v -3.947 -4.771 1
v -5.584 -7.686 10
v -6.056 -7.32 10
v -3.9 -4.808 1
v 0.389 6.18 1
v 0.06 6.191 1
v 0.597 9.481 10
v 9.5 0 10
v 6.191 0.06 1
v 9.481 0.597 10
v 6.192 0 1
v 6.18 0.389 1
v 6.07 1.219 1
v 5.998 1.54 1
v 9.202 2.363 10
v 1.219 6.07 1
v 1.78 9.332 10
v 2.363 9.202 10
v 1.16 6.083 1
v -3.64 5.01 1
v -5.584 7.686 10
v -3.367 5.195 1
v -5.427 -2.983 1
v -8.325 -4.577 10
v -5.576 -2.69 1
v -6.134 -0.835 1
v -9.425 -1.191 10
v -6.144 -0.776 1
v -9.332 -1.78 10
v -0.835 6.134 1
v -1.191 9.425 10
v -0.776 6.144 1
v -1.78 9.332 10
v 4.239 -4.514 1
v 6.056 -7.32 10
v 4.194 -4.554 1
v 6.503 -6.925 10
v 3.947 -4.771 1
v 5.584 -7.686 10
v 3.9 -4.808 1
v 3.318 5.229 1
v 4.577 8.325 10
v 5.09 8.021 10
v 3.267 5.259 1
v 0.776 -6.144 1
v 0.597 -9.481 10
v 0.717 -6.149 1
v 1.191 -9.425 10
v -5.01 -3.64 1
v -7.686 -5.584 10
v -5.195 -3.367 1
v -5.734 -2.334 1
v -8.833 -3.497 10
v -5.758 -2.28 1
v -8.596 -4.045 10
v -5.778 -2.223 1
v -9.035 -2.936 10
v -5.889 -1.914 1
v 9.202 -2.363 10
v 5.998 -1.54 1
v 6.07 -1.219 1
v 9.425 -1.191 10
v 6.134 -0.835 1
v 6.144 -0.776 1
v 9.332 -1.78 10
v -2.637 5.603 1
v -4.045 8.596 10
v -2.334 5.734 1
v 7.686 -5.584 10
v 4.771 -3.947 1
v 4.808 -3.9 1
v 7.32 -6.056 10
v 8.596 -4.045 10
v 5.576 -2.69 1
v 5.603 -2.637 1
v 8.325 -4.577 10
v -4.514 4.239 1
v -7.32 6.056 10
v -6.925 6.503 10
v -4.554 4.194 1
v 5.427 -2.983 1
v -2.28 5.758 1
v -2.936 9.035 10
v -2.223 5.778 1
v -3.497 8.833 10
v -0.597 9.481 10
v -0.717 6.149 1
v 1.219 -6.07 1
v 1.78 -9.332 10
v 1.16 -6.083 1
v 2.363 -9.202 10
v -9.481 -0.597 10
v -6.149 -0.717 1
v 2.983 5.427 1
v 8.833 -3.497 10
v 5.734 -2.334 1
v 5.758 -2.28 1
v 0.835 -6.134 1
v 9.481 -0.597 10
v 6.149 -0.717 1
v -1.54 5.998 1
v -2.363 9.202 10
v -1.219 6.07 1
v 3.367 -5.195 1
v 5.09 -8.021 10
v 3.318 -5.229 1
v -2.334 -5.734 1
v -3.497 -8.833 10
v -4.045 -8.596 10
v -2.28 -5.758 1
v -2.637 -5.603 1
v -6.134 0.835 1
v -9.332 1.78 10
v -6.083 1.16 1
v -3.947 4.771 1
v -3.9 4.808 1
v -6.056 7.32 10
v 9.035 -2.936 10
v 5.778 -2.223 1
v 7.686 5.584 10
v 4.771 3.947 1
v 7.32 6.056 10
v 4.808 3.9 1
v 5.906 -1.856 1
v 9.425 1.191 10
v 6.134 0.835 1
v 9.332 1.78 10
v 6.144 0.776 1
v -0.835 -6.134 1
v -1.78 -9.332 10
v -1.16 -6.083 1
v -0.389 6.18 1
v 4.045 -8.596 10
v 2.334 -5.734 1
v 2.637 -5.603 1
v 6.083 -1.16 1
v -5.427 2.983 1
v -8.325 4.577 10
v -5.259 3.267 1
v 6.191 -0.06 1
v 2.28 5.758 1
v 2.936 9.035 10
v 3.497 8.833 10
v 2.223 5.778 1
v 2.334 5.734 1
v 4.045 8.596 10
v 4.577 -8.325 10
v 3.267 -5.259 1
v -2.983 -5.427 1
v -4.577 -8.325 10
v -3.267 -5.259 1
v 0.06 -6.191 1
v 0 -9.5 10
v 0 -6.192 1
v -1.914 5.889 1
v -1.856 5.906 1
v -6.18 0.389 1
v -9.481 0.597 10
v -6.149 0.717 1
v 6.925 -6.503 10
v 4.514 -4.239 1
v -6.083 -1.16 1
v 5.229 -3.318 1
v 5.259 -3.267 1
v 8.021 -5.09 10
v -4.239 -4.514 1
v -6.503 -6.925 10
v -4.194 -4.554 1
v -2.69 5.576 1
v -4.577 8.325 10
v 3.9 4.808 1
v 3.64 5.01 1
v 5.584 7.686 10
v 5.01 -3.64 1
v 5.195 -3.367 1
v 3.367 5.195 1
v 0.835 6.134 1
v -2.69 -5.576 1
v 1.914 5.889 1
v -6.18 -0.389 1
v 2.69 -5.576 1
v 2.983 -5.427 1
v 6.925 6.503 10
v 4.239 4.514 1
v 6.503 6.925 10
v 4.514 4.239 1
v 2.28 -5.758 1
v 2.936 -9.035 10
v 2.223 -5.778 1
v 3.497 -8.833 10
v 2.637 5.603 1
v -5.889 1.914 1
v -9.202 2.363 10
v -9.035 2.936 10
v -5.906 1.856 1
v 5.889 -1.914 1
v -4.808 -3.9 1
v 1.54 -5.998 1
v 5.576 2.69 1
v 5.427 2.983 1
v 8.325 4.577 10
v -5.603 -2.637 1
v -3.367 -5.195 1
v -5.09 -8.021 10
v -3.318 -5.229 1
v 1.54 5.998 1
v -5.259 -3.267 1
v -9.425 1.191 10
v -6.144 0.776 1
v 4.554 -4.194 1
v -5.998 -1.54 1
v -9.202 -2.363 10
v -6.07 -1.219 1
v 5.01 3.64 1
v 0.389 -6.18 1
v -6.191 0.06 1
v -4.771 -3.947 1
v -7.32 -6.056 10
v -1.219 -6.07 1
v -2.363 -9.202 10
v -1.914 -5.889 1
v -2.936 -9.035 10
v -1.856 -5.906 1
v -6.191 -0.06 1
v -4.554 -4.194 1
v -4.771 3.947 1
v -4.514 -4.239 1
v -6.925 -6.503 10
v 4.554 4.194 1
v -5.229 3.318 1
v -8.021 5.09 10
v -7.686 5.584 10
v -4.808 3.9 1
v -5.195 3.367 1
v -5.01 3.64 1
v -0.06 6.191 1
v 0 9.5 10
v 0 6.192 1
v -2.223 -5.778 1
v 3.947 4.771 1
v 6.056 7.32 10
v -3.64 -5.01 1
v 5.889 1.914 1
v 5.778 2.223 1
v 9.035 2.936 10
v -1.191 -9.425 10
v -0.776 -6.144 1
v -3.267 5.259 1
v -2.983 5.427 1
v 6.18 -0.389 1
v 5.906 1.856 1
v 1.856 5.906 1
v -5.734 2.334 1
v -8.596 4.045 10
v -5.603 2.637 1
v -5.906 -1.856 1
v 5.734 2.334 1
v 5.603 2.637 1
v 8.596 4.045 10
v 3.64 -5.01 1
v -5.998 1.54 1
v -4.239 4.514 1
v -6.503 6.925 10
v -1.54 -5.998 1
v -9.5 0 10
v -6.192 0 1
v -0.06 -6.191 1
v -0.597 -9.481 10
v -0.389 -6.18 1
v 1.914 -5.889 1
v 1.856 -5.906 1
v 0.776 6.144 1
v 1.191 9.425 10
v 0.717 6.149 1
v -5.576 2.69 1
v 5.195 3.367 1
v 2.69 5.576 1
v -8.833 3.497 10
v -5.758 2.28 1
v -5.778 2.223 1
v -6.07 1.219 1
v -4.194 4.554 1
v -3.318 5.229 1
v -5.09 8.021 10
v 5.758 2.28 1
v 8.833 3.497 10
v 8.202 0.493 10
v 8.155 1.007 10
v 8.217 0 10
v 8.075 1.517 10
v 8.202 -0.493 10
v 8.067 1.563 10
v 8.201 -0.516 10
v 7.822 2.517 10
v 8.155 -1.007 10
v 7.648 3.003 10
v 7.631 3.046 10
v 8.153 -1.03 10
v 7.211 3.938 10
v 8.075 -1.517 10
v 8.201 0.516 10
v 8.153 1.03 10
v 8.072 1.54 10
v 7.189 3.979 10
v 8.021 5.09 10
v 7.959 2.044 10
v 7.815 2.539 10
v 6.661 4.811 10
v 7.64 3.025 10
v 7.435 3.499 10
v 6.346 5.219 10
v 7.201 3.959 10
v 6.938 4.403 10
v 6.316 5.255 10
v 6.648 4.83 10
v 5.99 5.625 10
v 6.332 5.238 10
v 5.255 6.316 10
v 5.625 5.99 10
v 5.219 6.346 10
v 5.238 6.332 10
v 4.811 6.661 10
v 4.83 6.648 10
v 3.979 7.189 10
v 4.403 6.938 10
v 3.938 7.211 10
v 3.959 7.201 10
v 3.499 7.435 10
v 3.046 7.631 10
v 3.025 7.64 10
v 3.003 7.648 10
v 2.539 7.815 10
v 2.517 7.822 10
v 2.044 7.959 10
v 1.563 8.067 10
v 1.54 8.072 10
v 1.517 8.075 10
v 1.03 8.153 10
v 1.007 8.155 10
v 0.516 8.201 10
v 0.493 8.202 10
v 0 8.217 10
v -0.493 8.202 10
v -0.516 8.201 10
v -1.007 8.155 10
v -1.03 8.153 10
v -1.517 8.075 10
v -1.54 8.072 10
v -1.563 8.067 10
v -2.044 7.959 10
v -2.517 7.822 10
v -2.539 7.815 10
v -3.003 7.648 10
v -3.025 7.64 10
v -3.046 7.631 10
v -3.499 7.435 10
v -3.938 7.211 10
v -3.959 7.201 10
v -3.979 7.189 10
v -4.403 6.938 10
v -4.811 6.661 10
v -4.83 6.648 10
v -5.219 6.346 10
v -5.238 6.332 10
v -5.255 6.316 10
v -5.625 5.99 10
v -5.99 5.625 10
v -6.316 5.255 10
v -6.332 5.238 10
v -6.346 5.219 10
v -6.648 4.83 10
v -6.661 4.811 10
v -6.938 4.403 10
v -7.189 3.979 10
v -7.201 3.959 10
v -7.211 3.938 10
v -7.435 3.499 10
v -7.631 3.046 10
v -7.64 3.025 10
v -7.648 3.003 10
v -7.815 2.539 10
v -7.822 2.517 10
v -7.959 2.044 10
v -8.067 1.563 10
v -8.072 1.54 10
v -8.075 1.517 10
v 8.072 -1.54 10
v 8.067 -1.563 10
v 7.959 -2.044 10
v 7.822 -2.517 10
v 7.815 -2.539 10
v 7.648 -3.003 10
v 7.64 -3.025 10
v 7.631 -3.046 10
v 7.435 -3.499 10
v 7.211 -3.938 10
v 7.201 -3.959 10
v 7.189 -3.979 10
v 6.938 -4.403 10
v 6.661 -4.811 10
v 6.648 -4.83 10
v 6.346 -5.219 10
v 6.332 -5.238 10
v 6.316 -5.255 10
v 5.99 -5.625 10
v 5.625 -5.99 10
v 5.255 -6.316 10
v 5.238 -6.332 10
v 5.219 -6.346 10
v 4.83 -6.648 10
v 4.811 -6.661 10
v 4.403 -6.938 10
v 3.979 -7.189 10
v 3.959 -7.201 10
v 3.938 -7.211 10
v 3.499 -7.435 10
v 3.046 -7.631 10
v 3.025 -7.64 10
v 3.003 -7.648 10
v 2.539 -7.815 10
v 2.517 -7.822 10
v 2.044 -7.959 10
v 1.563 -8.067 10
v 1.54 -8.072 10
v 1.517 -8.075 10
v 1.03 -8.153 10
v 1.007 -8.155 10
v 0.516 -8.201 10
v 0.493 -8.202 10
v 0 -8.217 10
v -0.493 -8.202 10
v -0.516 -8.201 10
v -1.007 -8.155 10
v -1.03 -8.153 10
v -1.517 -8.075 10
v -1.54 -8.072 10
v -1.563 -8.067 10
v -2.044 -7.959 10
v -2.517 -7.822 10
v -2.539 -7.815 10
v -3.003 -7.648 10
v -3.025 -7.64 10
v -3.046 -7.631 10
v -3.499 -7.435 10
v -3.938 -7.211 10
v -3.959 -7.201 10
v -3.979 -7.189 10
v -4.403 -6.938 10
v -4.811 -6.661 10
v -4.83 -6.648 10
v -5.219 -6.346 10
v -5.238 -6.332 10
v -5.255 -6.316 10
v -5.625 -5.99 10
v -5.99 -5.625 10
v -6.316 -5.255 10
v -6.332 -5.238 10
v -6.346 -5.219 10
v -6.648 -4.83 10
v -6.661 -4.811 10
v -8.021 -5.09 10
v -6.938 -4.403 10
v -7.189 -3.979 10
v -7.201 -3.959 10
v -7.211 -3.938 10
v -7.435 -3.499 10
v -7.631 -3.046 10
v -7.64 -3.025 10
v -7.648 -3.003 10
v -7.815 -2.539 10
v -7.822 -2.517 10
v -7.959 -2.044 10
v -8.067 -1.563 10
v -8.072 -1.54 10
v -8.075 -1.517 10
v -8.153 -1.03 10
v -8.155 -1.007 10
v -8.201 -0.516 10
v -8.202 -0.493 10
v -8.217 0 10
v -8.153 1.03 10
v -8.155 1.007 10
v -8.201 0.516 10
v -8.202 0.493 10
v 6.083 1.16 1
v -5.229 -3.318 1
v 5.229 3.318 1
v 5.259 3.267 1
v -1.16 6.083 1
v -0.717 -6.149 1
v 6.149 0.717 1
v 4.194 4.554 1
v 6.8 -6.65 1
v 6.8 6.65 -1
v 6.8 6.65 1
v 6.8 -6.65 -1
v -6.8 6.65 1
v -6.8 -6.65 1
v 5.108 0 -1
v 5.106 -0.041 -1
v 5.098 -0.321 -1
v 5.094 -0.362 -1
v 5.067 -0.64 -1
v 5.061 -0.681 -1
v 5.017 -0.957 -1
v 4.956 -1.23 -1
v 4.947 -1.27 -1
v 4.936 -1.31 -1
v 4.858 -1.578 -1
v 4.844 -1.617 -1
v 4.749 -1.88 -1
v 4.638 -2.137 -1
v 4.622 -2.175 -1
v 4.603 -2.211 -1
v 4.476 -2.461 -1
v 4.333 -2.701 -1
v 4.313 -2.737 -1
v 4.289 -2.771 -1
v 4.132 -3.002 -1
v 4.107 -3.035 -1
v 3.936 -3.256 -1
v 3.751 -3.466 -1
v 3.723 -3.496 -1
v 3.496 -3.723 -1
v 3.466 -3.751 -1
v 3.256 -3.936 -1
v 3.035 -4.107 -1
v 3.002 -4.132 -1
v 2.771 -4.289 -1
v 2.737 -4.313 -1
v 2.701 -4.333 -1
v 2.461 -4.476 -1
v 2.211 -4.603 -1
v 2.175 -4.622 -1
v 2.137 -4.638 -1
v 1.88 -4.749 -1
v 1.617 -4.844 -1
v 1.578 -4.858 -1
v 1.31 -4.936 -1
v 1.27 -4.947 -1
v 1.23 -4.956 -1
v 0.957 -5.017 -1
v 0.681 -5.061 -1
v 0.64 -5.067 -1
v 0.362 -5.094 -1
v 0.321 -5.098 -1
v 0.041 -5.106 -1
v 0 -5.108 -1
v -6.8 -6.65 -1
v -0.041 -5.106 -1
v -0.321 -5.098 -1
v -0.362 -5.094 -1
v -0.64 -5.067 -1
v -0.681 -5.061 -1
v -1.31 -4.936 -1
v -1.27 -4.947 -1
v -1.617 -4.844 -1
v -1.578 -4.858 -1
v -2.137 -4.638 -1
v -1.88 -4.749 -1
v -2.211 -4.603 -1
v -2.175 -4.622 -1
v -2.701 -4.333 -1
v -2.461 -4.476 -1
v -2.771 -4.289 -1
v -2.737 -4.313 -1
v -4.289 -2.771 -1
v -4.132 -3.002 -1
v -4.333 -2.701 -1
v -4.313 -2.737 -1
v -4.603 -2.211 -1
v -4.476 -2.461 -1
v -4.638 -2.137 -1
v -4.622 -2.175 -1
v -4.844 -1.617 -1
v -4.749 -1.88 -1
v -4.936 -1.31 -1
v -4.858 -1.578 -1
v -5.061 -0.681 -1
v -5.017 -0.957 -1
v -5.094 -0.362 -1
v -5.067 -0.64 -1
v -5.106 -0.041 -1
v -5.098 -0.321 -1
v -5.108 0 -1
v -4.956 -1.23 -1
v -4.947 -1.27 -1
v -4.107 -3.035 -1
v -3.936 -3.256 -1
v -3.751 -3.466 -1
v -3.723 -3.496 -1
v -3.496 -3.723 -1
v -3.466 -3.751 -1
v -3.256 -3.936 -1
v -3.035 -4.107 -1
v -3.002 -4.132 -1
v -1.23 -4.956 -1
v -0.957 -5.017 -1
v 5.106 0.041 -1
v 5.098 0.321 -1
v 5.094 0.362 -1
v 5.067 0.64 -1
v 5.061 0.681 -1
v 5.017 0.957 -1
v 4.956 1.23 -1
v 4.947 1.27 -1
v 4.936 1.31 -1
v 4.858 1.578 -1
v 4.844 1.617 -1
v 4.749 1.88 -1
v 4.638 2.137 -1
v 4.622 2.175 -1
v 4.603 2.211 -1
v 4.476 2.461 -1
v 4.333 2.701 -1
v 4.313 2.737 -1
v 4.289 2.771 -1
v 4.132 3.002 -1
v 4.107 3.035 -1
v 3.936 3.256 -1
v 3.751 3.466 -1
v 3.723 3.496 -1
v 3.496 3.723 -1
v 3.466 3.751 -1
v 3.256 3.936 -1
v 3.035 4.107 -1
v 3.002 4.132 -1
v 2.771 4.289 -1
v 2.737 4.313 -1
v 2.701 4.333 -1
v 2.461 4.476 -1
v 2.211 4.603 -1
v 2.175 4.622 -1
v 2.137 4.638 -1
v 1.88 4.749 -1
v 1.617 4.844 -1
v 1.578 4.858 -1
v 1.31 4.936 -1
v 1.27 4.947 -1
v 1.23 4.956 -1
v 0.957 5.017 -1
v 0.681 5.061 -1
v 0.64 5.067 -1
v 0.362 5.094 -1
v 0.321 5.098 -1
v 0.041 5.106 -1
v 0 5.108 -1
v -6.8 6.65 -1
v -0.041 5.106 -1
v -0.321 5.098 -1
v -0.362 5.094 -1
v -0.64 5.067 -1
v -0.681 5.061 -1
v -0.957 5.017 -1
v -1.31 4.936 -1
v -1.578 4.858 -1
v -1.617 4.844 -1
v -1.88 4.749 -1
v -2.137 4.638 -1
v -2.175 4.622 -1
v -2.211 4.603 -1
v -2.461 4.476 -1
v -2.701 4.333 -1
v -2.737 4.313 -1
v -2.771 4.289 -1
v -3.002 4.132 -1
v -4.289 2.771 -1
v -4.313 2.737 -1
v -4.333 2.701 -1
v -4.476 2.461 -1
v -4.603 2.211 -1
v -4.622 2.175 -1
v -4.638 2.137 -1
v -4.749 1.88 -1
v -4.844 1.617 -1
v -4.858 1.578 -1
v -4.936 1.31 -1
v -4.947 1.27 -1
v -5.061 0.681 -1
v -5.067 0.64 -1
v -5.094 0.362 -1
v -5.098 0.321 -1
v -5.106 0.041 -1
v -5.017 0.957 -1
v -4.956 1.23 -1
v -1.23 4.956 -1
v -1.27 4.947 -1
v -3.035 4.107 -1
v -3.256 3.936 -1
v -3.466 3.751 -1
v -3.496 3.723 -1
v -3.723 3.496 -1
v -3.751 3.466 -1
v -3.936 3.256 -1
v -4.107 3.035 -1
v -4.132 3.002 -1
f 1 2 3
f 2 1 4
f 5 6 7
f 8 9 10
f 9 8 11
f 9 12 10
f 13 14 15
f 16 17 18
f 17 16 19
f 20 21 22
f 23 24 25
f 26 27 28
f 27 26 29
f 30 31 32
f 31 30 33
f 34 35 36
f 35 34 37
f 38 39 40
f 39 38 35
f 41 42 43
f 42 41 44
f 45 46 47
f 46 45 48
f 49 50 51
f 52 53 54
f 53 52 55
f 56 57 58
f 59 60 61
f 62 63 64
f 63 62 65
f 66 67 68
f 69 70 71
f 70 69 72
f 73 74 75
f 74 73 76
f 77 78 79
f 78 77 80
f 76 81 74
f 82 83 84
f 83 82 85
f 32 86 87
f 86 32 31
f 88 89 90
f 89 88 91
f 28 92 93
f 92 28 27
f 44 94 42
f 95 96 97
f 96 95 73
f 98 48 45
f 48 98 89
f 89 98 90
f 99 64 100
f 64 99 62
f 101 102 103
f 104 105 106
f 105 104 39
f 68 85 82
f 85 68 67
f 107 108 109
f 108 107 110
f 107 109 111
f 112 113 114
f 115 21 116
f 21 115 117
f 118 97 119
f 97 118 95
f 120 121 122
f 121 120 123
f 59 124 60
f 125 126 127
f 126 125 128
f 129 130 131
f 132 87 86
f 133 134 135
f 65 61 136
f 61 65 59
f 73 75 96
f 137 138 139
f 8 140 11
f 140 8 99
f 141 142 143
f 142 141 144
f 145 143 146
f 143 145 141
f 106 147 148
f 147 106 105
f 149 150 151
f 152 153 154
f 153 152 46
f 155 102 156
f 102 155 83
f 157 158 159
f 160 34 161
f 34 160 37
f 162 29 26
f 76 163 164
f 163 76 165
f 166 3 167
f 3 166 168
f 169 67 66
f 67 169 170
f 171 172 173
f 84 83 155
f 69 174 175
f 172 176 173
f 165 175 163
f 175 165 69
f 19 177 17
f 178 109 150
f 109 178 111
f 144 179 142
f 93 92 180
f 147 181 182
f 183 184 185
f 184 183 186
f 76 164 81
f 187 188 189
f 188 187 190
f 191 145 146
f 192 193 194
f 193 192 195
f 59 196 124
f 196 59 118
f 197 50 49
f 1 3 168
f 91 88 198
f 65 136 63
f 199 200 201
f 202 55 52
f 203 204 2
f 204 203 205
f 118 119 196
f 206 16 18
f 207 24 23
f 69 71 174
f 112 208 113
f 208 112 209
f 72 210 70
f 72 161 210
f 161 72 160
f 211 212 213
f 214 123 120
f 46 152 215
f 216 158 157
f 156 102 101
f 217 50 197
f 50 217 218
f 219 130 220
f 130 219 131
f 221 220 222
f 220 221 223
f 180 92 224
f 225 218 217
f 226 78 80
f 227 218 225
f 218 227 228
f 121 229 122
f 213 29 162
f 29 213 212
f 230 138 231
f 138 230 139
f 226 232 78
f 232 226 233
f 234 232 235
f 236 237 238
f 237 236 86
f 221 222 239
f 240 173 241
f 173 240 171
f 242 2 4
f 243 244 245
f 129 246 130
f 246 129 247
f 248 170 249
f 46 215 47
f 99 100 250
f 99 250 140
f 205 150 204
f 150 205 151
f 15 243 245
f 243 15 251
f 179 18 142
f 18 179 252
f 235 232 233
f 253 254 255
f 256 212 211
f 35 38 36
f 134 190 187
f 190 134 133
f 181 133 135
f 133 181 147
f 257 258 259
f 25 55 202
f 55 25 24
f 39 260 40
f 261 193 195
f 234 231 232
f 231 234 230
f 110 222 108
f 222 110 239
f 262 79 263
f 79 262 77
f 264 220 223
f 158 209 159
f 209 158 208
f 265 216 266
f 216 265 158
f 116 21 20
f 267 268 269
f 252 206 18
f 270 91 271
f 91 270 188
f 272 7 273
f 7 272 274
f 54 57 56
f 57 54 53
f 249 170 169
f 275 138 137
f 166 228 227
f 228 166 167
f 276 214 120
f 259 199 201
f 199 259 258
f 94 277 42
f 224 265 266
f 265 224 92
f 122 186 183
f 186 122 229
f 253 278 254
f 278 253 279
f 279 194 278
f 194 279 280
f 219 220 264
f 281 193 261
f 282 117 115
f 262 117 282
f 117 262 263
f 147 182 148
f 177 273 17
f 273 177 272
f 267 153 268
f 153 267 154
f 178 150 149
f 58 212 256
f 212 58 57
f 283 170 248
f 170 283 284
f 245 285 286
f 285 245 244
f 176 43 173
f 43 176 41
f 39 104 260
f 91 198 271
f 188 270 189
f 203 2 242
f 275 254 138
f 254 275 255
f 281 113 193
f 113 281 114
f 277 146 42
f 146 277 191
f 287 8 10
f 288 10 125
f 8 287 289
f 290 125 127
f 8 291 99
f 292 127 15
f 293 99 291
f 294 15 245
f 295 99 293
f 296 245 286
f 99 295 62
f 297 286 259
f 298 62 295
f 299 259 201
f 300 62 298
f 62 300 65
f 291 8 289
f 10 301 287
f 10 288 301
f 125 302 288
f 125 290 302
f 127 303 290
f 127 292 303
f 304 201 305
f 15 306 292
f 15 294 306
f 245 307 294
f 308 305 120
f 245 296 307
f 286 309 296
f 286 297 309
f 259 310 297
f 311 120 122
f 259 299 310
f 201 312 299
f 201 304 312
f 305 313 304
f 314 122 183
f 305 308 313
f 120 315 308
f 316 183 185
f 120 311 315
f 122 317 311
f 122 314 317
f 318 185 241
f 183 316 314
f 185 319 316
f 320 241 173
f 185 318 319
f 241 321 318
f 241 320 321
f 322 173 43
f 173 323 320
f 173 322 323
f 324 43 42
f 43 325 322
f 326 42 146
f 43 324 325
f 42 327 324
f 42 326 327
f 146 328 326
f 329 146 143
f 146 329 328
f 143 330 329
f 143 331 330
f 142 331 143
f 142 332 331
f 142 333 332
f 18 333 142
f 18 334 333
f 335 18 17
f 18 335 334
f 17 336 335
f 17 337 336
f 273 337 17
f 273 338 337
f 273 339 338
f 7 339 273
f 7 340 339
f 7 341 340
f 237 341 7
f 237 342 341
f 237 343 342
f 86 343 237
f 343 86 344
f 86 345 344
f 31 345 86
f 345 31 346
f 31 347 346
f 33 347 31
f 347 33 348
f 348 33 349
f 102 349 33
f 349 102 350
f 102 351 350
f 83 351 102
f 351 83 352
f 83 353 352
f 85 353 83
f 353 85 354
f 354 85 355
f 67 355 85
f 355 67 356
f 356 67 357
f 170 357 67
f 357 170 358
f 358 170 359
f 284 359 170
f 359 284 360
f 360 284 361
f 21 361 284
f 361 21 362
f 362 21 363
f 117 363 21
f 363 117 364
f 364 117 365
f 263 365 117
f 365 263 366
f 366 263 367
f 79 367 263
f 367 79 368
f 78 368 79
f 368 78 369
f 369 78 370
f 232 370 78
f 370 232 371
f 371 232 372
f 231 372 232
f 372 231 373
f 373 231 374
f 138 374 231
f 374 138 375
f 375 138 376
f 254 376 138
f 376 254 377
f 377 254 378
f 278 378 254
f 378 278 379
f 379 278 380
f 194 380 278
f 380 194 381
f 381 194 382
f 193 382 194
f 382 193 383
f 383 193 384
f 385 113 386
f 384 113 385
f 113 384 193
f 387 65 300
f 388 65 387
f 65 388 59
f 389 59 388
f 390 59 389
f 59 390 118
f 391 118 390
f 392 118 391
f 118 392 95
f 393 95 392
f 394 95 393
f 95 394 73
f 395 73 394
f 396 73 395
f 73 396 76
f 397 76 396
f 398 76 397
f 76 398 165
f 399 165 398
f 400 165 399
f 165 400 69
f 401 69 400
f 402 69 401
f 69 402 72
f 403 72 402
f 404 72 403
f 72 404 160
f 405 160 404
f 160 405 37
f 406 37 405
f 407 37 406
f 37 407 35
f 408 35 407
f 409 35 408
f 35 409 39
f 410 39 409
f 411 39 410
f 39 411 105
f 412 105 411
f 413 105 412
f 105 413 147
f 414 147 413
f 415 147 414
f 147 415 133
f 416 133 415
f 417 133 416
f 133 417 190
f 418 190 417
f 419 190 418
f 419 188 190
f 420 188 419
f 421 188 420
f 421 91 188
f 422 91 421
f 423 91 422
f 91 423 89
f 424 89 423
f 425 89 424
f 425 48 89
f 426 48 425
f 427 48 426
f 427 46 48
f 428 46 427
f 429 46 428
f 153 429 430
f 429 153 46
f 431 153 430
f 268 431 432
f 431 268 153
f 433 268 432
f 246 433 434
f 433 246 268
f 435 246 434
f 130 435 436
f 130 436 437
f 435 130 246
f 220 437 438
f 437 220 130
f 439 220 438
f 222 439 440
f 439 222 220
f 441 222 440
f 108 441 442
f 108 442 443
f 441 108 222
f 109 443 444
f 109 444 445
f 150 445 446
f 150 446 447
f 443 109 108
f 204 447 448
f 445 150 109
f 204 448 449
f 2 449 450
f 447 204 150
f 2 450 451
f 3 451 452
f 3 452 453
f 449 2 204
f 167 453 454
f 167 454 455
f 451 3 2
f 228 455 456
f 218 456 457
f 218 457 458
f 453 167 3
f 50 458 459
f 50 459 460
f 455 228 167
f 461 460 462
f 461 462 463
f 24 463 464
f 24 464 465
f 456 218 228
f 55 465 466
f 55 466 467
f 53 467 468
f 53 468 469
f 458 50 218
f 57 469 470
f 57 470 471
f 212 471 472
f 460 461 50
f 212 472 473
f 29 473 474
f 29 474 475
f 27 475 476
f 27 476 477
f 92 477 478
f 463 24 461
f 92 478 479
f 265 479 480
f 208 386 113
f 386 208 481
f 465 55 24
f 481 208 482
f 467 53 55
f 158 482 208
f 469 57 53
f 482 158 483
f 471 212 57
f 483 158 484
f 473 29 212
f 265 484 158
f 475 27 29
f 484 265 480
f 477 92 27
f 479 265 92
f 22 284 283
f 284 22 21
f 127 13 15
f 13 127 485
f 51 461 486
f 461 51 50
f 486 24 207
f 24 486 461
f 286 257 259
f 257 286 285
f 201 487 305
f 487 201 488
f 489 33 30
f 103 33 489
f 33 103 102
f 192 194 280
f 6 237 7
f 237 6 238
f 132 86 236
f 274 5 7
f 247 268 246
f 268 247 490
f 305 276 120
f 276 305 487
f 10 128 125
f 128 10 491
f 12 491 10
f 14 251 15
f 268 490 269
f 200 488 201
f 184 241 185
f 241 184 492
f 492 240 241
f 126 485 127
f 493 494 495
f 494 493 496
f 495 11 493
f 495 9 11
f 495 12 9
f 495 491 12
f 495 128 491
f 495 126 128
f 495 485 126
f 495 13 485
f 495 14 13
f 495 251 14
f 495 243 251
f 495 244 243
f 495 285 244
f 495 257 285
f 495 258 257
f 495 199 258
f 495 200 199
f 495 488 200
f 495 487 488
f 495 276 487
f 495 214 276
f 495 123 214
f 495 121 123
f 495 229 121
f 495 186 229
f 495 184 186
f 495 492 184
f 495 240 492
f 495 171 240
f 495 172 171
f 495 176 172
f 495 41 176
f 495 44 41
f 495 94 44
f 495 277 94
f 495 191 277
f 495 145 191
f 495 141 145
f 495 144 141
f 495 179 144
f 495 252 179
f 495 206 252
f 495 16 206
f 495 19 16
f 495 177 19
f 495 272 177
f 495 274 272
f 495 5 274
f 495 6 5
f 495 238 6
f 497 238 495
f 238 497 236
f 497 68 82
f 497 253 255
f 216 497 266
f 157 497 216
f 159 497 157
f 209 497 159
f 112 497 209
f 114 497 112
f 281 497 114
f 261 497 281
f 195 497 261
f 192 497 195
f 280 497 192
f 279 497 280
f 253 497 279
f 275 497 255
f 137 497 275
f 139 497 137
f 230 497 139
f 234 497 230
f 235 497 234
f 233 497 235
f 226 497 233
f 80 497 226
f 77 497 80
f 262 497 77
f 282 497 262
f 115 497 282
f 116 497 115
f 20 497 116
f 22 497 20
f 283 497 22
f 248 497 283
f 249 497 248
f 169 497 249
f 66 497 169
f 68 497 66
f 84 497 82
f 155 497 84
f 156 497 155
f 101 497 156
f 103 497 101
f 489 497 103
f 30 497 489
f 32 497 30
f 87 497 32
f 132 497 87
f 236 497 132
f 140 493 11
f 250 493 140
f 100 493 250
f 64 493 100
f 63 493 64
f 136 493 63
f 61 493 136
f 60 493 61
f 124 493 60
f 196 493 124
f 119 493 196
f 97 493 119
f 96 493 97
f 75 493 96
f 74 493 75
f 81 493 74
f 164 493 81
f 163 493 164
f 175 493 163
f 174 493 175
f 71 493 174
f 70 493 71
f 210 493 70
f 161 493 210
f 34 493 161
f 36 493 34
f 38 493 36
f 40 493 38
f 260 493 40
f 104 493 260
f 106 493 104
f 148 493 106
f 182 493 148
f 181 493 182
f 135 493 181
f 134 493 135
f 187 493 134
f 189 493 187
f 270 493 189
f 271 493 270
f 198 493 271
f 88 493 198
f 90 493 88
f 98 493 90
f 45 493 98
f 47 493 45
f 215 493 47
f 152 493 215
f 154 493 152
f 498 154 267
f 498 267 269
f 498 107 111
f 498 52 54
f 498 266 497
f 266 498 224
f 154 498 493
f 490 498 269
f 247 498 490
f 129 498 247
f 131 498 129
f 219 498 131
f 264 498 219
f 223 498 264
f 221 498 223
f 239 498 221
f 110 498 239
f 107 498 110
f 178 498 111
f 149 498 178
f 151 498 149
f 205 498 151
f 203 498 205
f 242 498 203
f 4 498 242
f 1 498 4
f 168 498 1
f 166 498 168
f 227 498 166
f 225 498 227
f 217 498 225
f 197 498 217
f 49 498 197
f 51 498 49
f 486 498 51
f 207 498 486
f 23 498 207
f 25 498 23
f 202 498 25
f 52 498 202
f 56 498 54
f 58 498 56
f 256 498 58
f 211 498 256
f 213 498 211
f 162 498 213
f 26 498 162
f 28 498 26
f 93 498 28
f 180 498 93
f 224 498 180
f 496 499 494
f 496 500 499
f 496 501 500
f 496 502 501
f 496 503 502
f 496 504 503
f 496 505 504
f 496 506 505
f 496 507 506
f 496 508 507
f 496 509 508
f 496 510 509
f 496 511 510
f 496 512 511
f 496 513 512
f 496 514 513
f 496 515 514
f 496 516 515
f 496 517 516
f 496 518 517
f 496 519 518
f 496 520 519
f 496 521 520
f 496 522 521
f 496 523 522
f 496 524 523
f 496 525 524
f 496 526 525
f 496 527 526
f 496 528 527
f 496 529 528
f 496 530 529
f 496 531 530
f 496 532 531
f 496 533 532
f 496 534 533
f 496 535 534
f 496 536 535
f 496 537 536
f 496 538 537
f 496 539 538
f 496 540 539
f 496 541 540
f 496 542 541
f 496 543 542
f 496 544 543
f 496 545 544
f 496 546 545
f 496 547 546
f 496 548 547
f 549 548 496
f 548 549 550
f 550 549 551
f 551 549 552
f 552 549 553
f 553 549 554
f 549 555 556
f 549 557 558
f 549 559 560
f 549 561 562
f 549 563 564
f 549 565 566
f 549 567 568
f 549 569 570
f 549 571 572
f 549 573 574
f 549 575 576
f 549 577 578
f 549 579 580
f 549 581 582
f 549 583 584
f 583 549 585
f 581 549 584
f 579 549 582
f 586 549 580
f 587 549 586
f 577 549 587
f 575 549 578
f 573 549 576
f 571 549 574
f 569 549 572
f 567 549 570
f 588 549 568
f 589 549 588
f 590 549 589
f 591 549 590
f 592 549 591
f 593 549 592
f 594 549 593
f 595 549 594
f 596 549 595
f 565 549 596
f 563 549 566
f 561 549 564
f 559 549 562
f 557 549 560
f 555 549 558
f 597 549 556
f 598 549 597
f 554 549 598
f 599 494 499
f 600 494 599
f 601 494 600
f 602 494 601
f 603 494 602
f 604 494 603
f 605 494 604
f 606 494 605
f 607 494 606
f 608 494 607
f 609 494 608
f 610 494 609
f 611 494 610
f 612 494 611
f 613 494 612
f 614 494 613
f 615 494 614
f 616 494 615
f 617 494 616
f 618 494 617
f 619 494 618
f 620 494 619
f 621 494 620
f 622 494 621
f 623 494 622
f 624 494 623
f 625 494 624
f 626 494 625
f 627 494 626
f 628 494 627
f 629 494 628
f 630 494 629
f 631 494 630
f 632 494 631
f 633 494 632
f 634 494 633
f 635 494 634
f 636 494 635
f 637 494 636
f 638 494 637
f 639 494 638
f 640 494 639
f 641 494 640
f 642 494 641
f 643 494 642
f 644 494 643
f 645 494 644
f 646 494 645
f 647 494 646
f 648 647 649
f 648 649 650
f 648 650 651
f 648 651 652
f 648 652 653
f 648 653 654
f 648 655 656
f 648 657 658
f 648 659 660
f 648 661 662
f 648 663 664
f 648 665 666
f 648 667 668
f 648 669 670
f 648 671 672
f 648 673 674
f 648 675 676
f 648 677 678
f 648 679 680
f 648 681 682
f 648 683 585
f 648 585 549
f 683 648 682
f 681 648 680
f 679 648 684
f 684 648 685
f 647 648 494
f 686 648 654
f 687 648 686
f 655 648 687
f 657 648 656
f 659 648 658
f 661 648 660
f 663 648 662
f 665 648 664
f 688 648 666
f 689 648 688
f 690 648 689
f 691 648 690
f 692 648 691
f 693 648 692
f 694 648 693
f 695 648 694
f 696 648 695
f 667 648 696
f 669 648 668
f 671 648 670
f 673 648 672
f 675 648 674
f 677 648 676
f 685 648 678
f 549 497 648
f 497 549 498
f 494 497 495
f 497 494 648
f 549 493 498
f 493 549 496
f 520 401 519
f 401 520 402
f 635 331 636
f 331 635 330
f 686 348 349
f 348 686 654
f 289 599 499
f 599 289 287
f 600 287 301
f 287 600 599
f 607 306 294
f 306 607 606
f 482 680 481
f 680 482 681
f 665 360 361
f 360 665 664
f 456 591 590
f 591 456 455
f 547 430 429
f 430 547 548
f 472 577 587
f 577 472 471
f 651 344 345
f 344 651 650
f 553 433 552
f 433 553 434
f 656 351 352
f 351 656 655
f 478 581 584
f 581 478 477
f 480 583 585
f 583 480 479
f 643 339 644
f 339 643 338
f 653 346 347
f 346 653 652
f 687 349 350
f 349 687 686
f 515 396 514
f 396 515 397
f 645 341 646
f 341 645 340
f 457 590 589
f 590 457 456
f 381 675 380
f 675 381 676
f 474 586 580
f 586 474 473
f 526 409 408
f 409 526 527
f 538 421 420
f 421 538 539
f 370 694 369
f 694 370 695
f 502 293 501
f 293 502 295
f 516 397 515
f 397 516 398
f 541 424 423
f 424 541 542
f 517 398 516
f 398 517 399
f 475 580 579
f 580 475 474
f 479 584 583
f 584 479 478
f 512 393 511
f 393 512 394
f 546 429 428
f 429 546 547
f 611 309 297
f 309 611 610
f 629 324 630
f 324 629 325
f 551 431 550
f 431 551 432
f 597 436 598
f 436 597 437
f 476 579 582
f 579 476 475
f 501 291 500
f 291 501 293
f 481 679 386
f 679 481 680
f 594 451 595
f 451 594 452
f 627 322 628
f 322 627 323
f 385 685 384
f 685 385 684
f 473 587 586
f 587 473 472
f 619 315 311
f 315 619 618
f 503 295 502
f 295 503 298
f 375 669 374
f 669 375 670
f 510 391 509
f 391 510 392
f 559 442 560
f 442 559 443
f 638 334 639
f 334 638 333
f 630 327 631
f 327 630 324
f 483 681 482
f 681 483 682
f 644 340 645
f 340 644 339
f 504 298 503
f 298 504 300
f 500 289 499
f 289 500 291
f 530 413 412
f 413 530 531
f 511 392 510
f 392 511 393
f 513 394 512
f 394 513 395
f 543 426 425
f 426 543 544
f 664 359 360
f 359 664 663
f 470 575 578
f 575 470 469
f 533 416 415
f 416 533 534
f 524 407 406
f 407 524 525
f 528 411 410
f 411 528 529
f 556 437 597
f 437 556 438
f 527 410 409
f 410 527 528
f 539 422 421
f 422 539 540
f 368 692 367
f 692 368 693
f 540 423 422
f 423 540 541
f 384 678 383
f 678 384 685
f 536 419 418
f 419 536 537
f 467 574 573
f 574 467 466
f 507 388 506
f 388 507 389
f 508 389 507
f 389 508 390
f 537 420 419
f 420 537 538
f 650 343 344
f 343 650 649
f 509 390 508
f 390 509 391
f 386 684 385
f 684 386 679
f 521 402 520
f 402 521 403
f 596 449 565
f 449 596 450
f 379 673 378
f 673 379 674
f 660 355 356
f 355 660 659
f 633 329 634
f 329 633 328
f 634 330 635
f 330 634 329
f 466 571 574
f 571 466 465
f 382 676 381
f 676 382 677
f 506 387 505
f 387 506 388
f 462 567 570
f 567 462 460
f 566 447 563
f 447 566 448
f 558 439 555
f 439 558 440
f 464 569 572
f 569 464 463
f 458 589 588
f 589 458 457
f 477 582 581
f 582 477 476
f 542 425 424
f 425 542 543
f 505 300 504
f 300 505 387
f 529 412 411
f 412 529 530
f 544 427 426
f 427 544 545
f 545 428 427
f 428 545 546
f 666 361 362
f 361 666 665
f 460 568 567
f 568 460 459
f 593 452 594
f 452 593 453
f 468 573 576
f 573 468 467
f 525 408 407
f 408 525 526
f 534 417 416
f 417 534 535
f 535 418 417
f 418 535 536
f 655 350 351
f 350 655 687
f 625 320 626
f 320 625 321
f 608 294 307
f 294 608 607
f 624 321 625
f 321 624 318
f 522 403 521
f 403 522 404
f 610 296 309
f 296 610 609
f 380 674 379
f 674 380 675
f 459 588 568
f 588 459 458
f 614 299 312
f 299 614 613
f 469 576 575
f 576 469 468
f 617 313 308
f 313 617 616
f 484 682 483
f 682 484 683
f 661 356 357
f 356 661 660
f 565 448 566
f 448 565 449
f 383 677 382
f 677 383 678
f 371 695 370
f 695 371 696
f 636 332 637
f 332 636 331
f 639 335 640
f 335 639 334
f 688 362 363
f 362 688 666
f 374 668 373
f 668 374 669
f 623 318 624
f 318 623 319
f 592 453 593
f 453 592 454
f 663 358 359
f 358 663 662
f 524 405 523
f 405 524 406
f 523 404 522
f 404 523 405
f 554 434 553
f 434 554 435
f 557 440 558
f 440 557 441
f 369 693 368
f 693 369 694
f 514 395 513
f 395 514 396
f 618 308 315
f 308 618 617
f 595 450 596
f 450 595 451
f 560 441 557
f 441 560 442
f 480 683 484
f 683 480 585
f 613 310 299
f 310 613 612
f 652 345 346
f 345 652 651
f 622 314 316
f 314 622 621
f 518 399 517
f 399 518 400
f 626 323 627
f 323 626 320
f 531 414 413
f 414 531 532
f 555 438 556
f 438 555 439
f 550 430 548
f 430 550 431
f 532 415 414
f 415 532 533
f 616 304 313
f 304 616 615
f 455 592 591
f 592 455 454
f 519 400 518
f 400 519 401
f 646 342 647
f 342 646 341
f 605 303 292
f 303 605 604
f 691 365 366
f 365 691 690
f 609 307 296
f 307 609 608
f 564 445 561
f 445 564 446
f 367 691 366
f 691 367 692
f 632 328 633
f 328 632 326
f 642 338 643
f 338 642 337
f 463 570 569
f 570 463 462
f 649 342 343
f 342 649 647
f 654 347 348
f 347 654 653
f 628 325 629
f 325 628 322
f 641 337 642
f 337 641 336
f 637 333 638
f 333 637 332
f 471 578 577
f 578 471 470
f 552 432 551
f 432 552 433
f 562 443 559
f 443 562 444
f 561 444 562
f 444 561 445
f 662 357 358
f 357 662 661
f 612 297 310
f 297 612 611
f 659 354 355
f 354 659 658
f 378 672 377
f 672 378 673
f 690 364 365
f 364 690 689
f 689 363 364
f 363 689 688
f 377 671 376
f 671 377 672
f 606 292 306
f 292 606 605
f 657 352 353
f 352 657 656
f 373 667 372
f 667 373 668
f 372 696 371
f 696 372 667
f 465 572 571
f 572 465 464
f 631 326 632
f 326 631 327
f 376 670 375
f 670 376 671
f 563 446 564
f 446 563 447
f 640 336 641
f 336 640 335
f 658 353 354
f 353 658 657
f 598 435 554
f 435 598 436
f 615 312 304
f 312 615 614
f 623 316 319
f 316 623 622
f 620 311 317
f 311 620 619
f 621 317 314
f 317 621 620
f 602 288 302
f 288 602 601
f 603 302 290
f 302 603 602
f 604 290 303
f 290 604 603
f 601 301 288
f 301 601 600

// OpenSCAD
$fn = 100;

difference(){
union(){
cylinder(h=10,d1=11.65,d2=19);
cube([13.6,13.3,2],center=true);
}
translate([0,0,-2]){
cylinder(h=13,d1=9.65,d2=17);
}
}
